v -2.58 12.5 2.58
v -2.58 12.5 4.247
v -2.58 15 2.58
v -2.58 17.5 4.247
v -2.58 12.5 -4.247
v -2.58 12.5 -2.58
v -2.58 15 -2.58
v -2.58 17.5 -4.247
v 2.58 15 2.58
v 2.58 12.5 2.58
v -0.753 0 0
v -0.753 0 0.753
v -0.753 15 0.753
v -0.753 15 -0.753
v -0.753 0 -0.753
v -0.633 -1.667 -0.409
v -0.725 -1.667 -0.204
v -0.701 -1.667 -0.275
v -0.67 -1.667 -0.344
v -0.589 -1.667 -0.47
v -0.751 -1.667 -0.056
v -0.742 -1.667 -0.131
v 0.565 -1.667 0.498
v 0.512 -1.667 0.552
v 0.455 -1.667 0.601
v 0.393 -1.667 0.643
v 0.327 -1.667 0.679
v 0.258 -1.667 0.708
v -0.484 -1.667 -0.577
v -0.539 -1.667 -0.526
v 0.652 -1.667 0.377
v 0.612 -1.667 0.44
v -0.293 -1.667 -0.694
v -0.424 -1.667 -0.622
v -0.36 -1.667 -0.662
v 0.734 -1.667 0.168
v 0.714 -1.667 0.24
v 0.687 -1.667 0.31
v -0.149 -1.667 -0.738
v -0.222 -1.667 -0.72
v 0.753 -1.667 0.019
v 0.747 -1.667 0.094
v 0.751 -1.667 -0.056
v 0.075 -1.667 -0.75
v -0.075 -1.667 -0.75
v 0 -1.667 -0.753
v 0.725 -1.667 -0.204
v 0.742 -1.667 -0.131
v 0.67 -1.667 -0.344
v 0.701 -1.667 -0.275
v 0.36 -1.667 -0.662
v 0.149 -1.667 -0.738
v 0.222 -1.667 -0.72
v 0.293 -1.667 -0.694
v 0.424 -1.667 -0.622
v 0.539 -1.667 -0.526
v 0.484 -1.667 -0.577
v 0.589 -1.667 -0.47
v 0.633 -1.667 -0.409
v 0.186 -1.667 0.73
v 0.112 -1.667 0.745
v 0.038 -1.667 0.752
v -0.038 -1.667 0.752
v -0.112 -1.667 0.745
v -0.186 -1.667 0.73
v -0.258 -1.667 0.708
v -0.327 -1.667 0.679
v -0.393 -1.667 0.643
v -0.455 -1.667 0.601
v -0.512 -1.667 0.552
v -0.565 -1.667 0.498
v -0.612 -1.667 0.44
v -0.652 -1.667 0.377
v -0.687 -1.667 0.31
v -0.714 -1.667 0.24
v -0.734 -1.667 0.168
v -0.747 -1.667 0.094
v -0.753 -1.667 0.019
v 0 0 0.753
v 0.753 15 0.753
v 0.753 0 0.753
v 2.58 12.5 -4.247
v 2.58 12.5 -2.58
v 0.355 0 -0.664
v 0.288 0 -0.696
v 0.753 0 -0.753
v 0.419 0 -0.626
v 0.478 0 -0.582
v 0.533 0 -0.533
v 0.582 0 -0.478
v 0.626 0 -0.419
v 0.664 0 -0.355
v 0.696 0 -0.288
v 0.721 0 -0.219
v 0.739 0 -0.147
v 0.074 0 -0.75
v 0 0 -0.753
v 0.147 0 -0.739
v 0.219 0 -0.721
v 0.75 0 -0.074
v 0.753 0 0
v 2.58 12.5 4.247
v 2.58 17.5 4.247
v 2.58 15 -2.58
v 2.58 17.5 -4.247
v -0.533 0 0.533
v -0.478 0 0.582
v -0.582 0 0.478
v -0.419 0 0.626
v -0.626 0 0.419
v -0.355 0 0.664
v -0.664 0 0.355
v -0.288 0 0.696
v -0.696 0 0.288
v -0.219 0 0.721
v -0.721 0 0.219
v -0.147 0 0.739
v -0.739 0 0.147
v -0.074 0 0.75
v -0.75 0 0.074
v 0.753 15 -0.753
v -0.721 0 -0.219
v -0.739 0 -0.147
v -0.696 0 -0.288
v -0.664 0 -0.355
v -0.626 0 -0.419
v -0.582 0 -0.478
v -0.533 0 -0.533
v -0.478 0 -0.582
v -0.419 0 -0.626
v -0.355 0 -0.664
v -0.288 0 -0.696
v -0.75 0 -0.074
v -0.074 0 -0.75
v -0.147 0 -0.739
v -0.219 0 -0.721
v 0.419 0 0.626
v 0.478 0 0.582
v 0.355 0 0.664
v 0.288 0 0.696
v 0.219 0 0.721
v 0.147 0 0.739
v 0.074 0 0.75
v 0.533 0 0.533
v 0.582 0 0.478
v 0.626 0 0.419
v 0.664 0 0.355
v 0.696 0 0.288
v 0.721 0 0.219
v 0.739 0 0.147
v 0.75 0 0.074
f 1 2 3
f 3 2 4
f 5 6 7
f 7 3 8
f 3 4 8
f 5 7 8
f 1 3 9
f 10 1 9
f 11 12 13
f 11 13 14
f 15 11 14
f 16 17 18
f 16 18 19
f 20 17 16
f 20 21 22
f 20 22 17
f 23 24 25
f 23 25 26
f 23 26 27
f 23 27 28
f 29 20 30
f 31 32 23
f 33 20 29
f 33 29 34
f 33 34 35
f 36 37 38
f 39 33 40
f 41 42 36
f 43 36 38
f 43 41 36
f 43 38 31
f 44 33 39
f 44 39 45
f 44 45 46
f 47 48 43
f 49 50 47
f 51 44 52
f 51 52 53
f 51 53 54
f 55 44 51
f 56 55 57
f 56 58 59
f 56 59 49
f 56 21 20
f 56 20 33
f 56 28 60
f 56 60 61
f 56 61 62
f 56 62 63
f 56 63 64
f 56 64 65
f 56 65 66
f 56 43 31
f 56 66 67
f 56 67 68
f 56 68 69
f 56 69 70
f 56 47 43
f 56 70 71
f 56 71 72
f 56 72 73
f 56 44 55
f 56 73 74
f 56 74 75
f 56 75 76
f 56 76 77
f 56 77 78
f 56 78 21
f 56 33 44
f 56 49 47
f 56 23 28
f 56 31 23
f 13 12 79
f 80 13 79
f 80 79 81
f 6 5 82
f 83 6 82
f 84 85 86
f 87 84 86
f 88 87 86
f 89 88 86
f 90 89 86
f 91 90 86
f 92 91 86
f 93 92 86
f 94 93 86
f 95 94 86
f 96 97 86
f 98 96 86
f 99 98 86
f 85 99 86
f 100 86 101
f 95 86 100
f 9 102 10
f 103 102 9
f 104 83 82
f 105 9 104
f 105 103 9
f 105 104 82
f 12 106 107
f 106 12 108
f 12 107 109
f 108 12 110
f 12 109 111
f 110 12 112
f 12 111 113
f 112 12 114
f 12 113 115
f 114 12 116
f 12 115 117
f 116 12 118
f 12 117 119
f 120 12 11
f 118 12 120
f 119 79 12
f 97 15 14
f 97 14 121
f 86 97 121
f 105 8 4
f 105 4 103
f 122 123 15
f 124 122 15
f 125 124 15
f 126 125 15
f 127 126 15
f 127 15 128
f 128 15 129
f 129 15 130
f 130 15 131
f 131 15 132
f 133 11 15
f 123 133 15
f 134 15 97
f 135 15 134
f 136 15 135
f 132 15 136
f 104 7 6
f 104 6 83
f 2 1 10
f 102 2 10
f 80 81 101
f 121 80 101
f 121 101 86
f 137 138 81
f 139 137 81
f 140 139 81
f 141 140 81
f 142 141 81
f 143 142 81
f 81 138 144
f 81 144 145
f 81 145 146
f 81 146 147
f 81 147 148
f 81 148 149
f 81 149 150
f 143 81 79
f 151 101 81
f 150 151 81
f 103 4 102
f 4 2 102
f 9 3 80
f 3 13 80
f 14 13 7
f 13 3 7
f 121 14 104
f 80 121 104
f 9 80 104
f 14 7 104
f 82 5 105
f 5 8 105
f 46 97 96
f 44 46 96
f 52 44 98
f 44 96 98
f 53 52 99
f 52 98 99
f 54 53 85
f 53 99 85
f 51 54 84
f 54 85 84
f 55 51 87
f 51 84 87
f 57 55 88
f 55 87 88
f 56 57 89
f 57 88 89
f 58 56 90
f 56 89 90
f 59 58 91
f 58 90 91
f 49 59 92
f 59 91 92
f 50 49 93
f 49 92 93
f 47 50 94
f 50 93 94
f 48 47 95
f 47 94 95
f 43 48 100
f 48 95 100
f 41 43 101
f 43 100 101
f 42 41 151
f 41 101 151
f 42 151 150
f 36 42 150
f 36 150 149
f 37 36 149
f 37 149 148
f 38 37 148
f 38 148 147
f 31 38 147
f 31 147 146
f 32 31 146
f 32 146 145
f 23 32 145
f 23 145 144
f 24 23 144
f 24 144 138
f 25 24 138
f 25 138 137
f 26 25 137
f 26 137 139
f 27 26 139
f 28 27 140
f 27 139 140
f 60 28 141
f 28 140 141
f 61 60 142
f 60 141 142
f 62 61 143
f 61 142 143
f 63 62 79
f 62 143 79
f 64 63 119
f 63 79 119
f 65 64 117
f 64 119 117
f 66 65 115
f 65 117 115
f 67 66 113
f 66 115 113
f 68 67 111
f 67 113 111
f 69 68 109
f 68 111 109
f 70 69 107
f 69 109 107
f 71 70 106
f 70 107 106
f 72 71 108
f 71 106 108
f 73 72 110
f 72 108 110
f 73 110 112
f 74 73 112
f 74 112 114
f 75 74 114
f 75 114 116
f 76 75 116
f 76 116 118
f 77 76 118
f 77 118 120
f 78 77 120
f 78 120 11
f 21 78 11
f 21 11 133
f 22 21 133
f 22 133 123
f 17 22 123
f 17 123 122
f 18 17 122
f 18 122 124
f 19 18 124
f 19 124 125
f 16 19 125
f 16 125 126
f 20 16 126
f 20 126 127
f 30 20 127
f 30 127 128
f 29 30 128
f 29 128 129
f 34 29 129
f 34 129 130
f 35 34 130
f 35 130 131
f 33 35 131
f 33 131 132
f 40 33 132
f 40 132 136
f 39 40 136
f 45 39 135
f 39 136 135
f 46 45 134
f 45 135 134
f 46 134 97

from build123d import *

# Parameters (mm, degrees)
SKETCH1_W           = 1.506666666
SKETCH1_H           = 1.506666666
BOSS_EXTRUDE1_DEPTH = 15
SKETCH2_R           = 0.753333333
BOSS_EXTRUDE2_DEPTH = 1.666666667
SKETCH3_W           = 5.16
SKETCH3_H           = 8.493333334
BOSS_EXTRUDE3_DEPTH = 2.5
SKETCH3_3_W         = 5.16
SKETCH3_3_H         = 1.666666667
BOSS_EXTRUDE4_DEPTH = 2.5


with BuildPart() as part:
    # Sketch1 → Boss-Extrude1 (new body)
    with BuildSketch(Plane(origin=(0, 0, 0), x_dir=(1, 0, 0), z_dir=(0, 1, 0))):
        Rectangle(SKETCH1_W, SKETCH1_H)
    extrude(amount=BOSS_EXTRUDE1_DEPTH)

    # Sketch2 → Boss-Extrude2 (add)
    with BuildSketch(Plane.XZ):
        Circle(SKETCH2_R)
    extrude(amount=BOSS_EXTRUDE2_DEPTH)

    # Sketch3 → Boss-Extrude3 (add)
    with BuildSketch(Plane(origin=(0, 15, 0), x_dir=(1, 0, 0), z_dir=(0, 1, 0))):
        Rectangle(SKETCH3_W, SKETCH3_H)
    extrude(amount=BOSS_EXTRUDE3_DEPTH)

    # Sketch3<3> → Boss-Extrude4 (add)
    with BuildSketch(Plane(origin=(0, 15, 0), x_dir=(1, 0, 0), z_dir=(0, 1, 0))):
        with Locations((0, 3.413333334)):
            Rectangle(SKETCH3_3_W, SKETCH3_3_H)
        with Locations((0, -3.413333334)):
            Rectangle(SKETCH3_3_W, SKETCH3_3_H)
    extrude(amount=-BOSS_EXTRUDE4_DEPTH)


solid = part.part
